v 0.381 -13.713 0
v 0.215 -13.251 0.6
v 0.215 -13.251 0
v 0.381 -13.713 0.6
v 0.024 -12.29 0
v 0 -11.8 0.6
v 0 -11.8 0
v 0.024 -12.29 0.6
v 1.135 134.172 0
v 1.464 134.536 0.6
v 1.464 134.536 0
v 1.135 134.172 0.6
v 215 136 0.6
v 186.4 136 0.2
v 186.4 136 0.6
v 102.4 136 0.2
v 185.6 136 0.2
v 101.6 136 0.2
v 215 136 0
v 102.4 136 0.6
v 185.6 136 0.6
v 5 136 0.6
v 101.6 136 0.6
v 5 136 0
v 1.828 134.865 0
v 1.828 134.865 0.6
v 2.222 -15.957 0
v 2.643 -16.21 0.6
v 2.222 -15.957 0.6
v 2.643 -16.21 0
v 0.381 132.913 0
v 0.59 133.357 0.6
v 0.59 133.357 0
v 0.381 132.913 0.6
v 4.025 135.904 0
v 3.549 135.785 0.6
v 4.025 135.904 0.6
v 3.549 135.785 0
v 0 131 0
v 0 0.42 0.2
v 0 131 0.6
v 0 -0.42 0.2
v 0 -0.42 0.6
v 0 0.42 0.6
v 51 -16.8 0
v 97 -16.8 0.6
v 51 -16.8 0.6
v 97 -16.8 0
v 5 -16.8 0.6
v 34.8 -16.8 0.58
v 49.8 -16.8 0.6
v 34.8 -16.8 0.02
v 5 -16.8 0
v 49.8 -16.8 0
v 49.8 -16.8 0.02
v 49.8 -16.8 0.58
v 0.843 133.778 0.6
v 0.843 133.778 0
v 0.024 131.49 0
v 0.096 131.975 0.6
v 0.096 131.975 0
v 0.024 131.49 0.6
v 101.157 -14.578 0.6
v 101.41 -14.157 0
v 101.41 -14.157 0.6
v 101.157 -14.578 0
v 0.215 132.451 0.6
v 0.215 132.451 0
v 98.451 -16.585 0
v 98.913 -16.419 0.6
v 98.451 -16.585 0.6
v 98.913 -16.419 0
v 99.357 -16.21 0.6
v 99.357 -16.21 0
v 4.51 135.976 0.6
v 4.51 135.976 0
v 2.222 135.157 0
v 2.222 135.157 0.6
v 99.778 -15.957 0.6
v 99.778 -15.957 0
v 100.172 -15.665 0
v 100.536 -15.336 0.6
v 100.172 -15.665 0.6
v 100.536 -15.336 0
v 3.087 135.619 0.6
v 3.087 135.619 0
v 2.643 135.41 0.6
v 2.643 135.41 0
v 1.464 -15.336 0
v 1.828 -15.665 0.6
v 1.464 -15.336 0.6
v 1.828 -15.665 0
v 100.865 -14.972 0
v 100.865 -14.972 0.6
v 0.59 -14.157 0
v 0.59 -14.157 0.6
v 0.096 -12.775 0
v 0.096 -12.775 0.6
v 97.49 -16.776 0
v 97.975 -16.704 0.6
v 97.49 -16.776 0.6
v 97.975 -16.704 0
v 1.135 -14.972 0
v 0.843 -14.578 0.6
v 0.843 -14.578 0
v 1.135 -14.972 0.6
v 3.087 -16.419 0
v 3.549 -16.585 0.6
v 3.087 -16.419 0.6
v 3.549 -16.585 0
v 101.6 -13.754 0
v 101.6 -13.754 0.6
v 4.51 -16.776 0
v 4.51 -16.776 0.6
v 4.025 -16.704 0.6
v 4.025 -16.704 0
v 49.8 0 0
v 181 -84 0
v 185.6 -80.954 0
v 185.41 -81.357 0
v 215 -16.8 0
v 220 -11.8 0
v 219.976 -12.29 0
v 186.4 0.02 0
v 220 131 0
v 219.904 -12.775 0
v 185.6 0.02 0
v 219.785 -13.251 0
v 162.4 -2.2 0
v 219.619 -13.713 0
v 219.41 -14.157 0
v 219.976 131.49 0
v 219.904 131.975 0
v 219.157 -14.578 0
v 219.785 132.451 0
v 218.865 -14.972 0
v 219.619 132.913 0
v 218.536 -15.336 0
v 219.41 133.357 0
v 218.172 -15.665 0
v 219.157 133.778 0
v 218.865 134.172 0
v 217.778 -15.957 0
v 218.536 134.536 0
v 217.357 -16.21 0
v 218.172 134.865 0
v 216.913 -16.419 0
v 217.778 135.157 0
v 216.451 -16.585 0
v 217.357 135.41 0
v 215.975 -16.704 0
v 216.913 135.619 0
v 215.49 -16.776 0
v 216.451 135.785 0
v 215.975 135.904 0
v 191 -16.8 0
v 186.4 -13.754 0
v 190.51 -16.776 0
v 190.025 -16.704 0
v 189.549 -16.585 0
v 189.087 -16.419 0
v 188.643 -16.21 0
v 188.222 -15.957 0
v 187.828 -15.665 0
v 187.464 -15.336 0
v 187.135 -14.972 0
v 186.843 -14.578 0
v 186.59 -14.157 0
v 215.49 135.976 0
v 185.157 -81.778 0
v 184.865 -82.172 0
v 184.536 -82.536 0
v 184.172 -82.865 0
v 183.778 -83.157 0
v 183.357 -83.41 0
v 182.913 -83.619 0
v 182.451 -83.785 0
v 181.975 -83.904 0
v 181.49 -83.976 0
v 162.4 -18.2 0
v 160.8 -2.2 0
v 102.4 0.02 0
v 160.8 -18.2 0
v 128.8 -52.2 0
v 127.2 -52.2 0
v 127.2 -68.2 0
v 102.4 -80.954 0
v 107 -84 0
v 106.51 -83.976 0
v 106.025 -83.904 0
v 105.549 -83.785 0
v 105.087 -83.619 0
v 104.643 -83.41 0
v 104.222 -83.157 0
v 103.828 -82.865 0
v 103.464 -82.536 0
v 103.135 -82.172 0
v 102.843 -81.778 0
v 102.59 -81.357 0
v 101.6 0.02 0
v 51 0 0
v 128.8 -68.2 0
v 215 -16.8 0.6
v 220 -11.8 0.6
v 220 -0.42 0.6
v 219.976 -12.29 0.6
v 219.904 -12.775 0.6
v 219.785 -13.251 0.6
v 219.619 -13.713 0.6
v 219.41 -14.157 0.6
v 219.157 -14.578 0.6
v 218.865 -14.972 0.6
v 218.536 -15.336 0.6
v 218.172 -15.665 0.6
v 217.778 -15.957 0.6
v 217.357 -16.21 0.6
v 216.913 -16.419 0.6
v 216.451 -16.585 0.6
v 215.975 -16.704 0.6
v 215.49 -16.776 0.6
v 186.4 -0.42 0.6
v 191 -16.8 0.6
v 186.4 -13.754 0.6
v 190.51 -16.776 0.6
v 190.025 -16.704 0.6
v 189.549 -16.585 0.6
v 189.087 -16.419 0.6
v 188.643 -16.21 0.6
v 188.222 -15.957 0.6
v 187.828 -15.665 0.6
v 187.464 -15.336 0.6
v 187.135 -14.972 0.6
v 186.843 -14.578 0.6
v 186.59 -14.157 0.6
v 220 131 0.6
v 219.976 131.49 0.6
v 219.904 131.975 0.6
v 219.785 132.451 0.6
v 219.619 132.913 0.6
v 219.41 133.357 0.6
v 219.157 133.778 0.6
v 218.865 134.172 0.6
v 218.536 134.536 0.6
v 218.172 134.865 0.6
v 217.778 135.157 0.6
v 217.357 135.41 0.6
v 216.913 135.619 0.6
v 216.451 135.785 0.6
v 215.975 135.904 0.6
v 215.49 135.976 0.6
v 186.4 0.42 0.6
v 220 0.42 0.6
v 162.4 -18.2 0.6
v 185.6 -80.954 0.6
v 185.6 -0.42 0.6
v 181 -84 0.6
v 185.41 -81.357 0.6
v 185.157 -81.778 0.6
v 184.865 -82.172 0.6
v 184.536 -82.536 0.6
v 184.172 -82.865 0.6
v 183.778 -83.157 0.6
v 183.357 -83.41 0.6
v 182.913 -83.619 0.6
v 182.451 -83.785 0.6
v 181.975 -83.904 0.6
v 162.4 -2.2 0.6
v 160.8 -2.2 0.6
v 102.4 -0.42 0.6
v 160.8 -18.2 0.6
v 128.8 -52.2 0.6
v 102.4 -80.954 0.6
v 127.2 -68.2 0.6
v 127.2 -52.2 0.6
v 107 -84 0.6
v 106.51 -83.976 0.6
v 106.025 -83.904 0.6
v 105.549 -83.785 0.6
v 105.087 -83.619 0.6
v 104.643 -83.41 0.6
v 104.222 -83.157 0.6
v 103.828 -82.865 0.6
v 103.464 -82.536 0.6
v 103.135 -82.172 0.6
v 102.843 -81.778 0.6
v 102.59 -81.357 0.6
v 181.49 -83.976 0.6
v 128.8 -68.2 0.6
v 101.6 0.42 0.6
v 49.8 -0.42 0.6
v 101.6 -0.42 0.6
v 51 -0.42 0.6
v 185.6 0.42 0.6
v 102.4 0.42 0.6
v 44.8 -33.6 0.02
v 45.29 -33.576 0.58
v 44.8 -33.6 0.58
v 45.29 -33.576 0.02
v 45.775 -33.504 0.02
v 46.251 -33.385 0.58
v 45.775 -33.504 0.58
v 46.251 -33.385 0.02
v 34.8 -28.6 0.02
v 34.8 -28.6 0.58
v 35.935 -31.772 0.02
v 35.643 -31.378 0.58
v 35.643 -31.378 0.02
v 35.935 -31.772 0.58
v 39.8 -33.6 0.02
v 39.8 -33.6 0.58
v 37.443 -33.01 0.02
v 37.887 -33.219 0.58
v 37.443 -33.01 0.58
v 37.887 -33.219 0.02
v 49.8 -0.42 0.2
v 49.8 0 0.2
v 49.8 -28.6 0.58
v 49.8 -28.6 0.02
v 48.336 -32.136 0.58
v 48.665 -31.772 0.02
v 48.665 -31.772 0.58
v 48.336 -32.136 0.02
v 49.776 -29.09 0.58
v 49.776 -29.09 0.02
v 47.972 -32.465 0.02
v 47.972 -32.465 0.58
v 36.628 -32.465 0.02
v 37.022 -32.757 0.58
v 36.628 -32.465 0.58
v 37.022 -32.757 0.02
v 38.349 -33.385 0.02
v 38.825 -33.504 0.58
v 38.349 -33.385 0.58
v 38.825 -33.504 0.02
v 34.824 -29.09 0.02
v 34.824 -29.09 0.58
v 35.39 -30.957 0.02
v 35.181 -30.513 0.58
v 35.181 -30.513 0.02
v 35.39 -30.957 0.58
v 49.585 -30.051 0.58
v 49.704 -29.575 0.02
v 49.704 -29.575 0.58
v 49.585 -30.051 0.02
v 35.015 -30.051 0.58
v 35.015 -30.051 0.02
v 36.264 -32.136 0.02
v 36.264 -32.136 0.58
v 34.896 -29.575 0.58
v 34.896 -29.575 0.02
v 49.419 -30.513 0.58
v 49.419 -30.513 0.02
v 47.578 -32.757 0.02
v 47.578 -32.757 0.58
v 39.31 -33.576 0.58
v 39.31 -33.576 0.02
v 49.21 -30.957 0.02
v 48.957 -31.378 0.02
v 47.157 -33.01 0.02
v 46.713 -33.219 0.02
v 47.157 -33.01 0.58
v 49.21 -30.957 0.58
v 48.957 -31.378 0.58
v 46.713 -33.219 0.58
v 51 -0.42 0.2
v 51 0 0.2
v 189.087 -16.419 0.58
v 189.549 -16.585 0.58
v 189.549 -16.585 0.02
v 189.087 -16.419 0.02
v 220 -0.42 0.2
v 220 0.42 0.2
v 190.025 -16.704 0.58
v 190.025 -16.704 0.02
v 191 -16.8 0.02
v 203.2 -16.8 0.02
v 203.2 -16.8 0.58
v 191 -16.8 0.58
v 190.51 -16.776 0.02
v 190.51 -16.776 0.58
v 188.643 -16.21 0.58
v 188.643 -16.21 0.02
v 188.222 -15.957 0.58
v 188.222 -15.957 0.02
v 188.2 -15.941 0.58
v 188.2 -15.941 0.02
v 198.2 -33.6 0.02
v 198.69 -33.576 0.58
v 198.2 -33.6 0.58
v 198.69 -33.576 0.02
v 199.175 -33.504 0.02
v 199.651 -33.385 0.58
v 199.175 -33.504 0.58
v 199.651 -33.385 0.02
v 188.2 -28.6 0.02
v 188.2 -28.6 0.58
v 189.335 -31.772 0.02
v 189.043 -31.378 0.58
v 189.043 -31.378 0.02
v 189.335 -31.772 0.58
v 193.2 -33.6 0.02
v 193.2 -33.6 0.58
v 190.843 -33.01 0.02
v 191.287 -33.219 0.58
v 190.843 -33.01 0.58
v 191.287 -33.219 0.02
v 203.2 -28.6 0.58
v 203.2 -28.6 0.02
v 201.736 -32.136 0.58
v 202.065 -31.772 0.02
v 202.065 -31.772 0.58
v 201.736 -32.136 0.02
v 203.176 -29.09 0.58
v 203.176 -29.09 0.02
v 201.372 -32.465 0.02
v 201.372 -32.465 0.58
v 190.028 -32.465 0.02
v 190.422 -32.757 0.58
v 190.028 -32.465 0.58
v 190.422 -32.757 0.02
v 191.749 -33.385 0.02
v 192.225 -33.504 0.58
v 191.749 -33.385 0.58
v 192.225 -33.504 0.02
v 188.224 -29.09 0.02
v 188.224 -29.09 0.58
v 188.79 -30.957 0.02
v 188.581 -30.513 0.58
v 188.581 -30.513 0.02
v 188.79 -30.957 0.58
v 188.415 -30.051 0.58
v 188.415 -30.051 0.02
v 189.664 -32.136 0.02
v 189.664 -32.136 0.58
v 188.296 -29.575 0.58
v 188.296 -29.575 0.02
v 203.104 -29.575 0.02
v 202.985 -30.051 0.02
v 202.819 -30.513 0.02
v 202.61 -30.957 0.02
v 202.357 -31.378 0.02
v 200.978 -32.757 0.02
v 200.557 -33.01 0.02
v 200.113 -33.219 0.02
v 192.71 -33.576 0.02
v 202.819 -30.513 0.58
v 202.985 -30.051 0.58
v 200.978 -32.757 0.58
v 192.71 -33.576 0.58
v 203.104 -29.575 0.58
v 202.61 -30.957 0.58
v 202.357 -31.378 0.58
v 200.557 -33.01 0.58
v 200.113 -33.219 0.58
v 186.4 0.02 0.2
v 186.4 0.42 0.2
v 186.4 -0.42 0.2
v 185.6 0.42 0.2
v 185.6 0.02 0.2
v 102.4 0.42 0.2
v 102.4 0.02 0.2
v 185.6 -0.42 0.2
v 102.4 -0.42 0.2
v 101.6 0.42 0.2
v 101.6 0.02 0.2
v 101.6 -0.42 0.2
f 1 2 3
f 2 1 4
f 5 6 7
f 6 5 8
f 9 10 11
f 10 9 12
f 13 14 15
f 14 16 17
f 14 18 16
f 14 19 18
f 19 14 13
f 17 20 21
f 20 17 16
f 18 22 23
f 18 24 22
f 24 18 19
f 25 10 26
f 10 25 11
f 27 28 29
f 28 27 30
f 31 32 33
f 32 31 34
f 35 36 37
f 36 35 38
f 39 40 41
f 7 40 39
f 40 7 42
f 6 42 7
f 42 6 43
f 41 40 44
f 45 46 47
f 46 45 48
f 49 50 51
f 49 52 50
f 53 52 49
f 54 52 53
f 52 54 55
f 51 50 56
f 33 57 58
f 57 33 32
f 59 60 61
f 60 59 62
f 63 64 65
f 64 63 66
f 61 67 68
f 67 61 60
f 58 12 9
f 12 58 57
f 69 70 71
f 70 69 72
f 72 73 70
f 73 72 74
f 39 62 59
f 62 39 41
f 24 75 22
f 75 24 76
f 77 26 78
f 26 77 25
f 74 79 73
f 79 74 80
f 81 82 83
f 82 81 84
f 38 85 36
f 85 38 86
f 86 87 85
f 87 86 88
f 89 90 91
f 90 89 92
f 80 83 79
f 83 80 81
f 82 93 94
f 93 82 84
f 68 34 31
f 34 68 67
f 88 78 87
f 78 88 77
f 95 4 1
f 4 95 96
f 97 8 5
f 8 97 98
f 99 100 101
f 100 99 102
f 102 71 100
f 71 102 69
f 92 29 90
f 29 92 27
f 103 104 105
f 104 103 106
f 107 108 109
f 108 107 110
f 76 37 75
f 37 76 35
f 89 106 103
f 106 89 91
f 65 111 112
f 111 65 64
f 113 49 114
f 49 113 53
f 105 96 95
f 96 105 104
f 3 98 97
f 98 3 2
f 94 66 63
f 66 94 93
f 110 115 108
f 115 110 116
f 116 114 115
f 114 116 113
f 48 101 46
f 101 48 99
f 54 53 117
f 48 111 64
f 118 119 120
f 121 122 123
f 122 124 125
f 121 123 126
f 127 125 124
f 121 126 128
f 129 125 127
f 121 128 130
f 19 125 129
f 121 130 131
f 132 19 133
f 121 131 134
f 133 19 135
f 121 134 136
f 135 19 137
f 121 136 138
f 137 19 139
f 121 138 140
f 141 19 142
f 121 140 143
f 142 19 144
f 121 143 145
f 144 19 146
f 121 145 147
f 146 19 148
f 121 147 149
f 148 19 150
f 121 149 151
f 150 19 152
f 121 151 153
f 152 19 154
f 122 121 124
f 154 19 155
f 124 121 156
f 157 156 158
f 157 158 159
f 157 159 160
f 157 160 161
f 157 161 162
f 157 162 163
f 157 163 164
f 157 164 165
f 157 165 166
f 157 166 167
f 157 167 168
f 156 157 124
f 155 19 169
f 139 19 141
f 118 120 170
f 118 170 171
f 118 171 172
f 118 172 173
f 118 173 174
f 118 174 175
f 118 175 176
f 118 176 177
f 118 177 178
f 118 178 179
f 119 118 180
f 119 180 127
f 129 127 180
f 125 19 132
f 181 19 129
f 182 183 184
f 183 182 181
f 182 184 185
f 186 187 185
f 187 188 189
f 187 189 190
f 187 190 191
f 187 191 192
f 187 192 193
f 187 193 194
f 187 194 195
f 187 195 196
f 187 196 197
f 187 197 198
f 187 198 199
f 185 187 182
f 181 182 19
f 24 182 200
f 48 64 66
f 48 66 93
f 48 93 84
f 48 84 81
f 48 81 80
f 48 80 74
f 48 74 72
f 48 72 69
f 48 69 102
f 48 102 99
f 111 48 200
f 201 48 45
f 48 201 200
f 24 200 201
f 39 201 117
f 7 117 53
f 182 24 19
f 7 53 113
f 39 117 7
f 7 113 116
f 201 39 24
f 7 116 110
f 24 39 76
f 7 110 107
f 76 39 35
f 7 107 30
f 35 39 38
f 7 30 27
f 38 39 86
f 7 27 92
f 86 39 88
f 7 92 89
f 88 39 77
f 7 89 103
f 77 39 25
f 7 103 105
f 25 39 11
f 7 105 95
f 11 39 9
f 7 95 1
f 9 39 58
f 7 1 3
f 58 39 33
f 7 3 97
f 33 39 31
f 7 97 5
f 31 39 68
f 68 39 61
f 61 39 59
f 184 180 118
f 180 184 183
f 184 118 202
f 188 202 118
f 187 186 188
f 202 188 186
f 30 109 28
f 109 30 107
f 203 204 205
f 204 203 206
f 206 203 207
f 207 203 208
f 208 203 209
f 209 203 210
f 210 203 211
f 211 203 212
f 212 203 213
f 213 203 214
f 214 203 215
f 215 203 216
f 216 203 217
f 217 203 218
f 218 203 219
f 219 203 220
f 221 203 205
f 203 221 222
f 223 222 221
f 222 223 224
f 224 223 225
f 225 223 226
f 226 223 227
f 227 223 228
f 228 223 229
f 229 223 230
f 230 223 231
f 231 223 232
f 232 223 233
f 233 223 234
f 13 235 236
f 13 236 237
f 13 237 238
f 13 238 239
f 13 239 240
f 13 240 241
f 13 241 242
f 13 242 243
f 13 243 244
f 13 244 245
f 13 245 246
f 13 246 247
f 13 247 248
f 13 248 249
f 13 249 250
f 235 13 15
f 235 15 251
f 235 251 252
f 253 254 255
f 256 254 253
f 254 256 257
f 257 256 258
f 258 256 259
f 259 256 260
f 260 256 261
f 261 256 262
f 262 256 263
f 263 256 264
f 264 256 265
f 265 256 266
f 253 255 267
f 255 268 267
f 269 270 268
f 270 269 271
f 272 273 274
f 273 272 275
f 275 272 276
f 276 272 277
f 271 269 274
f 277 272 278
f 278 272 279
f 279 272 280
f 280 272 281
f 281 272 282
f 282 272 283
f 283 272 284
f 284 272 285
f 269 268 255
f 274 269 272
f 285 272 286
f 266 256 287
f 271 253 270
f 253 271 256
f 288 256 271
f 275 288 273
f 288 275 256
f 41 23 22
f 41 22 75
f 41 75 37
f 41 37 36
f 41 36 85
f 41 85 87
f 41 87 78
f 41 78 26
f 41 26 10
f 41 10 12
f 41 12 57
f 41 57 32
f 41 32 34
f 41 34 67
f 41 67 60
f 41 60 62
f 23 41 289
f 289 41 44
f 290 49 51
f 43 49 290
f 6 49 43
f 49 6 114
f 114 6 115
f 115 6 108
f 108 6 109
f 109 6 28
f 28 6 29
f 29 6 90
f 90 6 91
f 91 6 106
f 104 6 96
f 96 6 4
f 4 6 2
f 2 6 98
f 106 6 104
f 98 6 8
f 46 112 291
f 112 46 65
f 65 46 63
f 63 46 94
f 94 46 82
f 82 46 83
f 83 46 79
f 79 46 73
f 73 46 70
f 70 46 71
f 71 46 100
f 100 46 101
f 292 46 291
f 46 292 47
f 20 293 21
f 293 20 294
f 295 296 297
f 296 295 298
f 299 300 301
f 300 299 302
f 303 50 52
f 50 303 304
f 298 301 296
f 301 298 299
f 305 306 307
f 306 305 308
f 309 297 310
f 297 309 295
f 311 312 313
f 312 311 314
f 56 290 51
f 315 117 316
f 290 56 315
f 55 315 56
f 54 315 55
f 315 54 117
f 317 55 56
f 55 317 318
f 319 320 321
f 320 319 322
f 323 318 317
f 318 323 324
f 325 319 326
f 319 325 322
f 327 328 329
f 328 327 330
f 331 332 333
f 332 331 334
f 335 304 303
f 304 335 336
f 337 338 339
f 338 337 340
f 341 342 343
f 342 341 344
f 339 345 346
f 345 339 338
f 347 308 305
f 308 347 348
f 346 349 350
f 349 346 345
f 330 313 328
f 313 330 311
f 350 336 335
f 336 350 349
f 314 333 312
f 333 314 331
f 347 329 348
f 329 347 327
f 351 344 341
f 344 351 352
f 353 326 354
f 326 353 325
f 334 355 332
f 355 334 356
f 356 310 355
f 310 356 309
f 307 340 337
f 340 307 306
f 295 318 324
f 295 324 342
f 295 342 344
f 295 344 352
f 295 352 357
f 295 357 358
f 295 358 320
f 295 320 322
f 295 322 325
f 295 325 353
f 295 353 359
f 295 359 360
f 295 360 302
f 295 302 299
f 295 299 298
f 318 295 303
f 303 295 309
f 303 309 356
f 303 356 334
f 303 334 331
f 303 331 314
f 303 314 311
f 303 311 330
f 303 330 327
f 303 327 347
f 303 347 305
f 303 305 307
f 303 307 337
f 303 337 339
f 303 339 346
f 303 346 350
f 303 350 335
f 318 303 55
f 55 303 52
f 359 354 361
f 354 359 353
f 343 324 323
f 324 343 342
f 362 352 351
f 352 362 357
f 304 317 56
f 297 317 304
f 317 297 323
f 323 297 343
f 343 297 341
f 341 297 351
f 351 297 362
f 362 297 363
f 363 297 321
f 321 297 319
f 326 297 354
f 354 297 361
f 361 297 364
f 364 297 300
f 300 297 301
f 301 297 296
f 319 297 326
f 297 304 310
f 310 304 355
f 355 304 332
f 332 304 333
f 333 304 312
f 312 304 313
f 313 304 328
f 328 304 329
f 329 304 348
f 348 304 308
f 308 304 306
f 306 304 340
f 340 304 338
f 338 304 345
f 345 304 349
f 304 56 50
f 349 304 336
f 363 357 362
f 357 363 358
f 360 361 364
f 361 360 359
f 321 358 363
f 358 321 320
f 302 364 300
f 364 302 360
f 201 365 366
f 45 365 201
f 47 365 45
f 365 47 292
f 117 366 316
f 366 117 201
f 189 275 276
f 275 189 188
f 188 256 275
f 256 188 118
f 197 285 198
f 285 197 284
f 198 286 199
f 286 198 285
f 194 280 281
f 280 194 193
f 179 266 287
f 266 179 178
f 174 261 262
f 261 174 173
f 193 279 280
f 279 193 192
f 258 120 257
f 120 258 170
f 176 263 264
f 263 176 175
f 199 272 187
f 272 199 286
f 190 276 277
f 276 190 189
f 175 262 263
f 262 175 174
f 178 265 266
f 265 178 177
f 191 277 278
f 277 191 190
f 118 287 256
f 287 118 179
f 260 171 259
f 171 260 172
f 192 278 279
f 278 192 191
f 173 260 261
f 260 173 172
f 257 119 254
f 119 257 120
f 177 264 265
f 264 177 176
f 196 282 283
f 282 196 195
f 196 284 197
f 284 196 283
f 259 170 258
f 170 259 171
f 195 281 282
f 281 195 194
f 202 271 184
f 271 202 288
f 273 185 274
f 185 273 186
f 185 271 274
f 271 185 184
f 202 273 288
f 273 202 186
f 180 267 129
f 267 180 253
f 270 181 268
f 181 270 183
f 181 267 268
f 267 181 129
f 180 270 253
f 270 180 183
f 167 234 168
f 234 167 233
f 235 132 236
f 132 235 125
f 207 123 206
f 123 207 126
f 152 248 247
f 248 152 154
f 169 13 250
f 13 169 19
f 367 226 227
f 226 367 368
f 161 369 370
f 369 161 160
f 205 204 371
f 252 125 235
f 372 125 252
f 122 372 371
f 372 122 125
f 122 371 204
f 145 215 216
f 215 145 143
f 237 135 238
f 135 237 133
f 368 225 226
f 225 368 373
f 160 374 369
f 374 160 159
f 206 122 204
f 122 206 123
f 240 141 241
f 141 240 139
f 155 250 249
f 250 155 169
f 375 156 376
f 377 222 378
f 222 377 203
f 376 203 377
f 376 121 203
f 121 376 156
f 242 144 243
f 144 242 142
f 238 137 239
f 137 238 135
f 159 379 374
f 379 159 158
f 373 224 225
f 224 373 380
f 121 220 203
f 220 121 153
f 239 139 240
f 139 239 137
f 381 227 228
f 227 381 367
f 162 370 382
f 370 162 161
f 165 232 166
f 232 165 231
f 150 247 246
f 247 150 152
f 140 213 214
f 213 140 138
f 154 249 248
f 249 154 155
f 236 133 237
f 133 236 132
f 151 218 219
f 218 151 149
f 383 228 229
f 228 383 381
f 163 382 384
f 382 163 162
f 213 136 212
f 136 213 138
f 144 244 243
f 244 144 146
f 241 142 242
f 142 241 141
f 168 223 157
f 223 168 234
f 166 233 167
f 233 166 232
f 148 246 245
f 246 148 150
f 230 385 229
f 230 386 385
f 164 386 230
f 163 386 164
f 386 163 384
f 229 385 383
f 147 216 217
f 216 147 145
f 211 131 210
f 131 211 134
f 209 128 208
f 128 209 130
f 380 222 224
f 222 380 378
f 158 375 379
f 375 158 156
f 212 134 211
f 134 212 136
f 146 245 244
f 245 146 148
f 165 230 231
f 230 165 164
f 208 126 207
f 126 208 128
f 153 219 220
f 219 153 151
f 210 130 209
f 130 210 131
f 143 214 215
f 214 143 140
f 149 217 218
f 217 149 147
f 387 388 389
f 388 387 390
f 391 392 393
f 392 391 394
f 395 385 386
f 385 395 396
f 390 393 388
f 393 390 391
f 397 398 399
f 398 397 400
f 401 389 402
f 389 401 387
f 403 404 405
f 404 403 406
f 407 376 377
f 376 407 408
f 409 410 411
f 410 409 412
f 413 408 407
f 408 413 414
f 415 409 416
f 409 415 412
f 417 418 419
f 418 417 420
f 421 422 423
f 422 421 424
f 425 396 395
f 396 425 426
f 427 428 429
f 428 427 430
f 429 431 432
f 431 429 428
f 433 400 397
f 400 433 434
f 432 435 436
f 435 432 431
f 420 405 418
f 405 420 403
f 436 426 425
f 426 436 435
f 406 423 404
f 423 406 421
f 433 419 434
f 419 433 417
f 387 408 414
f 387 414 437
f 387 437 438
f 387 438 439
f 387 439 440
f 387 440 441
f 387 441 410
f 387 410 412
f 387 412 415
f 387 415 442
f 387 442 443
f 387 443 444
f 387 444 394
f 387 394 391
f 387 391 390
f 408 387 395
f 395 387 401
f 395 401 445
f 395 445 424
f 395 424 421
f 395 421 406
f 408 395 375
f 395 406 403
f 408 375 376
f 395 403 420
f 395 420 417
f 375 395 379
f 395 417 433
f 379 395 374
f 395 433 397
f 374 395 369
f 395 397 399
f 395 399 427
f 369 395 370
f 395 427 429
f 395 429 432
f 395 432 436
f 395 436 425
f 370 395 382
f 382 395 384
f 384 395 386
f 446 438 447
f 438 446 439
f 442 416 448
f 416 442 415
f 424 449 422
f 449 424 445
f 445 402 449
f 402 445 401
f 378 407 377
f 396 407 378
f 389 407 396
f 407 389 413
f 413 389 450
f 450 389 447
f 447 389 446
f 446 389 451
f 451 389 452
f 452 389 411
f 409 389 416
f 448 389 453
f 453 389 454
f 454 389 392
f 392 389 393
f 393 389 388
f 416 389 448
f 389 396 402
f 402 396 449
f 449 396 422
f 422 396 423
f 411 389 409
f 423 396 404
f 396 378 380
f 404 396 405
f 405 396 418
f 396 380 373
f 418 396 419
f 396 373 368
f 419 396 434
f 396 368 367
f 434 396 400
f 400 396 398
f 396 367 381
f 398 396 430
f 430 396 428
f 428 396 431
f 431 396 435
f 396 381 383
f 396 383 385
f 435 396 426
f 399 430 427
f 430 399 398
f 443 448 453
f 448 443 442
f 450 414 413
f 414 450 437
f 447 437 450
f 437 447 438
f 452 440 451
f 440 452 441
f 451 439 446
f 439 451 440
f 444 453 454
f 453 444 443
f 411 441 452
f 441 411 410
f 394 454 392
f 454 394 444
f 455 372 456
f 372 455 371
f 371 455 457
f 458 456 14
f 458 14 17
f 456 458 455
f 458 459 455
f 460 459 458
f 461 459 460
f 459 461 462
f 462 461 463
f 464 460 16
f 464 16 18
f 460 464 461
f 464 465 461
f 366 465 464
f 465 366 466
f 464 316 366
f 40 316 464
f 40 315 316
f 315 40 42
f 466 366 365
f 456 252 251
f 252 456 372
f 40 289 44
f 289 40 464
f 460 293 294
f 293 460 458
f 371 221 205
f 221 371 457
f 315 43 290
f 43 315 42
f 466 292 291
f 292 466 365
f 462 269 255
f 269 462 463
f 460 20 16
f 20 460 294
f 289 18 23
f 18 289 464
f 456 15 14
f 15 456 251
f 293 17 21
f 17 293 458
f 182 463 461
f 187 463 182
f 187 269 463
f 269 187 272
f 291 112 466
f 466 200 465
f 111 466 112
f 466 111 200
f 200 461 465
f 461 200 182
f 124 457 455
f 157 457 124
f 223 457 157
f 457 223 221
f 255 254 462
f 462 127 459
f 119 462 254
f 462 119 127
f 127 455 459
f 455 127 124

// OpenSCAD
/*
Script Name: EmSCAD Trifold Shade
Description: Parametric shade for phones and tablets
Repository: https://github.com/em-sea/EmSCAD/
Copyright (C) 2026 em-sea
SPDX-License-Identifier: GPL-3.0-or-later
Glossary:
    Panel: One of three main shade parts
    Tab: Bottom panel portion to fold under the phone
    Connector: Smaller tab at the bottom of a tab to insert into a connector slot
    Connector slot: Narrow hole in the center tab that holds a connector
    Hinge: Indentations between the panels and tabs to enable folding
    Frame: Solid margin kept around connectors and slots
    ps_: Prefix for Popsocket cutout variables
*/

/* [General Dimensions (sizes in mm and %)] */
// Total width and length of the shade with tabs
max_size = 220; // [100:1:400]
center_panel_width = 84; // [50:1:200]
left_panel_percent = 75; // [0:1:100]
// Length of the center tab (0 uses the center panel width)
center_tab_length = 0; // [0:1:200]

/* [Popsocket Cutout (mm)] */
// Distance from the fold line to the center of the cutout
ps_top_distance = 84; // [0:1:200]
// Cutout radius (0 disables)
ps_radius = 0; // [0:1:30]
ps_slot_width = 10; // [1:1:30]

/* [Aesthetics & Tolerances (mm or %)] */
connector_width = 15; // [1:1:50]
connector_percent = 40; // [0:1:100]
// Distance of each connector slot from the center tab's side edge (percent of center panel width)
connector_slot_distance = 30; // [0:1:100]
connector_frame = 20; // [1:1:50]
corner_radius = 5; // [1:1:20]
connector_slot_clearance = 0.2; // [0:0.05:1]

/* [Printing Variables] */
// Extrusion line width of nozzle, hinges are 2x
extrusion_width = 0.4; // [0.2:0.01:1.2]
shade_thickness = 0.6; // [0.2:0.1:3]
// First layer height (mm)
first_height = 0.2; // [0.1:0.05:0.6]
// Height of each layer after the first (mm)
layer_height = 0.2; // [0.05:0.05:0.6]
// Layers left under each hinge, counting the first layer
hinge_layers = 1; // [1:1:5]

/* [Hidden] */
$fn = $preview ? 32 : 64;
EPSILON = 0.02;

// Calculated Variables
hinge_width = extrusion_width * 2;
left_panel_width = (max_size - center_panel_width) * left_panel_percent / 100;
right_panel_width = max_size - center_panel_width - left_panel_width;
middle_tab_length = center_tab_length > 0 ? center_tab_length : center_panel_width;
connector_slot_w = shade_thickness * 2;
connector_slot_l = connector_width + shade_thickness;
connector_slot_h = shade_thickness * 2 + (EPSILON * 2);
connector_l = center_panel_width * connector_percent / 100;
longest_tab = max(middle_tab_length, connector_l);
shade_length = max_size - longest_tab;
frame_size = center_panel_width * connector_frame / 100;
slot_x_offset = center_panel_width * connector_slot_distance / 100;
cut_height = shade_thickness + 2 * EPSILON;
top_cut_z = first_height + ((hinge_layers - 1) * layer_height);
large_connector_slot_w = connector_slot_w + (2 * connector_slot_clearance);
large_connector_slot_l = connector_slot_l + (2 * connector_slot_clearance);
right_panel_start_x = left_panel_width + center_panel_width;
lowest_connector = (ps_radius > 0) ? ps_top_distance - ps_radius + frame_size : middle_tab_length;
right_panel_connector_end = right_panel_start_x + min(right_panel_width, lowest_connector) - frame_size;
right_panel_connector_start = max(right_panel_connector_end - connector_width, right_panel_start_x);
left_panel_connector_start = max(left_panel_width - min(left_panel_width, lowest_connector) + frame_size, frame_size);
left_panel_connector_end = min(left_panel_width, left_panel_connector_start + connector_width);

module LeftPanel() {
    difference() {
        union() {
            CubeWithTab(left_panel_width, shade_length, frame_size, corner_radius, "purple", round_top_left = true);
            if (left_panel_connector_end < left_panel_width) {
                translate([left_panel_connector_start, 0, 0])
                    CubeWithTab(connector_width, 0, connector_l, corner_radius, "red", inset = EPSILON);
            }
        }
        if (left_panel_connector_end + connector_width + connector_slot_w < left_panel_width) {
            ConnectorSlot(left_panel_connector_end);
        }
    }
}

module RightPanel() {
    difference() {
        union() {
            translate([right_panel_start_x, 0, 0])
                CubeWithTab(right_panel_width, shade_length, frame_size, corner_radius, "yellow", round_top_right = true);
            if (right_panel_connector_start < right_panel_connector_end) {
                translate([right_panel_connector_start, 0, 0])
                    CubeWithTab(connector_width, 0, connector_l, corner_radius, "orange", inset = EPSILON);
            }
        }
        if (right_panel_start_x + frame_size < right_panel_connector_start) {
            ConnectorSlot(right_panel_connector_start - connector_slot_w);
        }
    }
}

module CenterPanel() {
    translate([left_panel_width, 0, 0]) {
        difference() {
            CubeWithTab(center_panel_width, shade_length, middle_tab_length, corner_radius, "lightseagreen");
            if (ps_radius > 0) {
                PopsocketCutout();
            }
            if (left_panel_connector_end < left_panel_width) {
                CenterConnectorSlot(slot_x_offset, -left_panel_width + left_panel_connector_end - large_connector_slot_l);
            }
            if (right_panel_connector_start < right_panel_connector_end) {
                CenterConnectorSlot(center_panel_width - slot_x_offset, -right_panel_connector_start + right_panel_start_x - large_connector_slot_l);
            }
        }
    }
}

module PopsocketCutout() {
    translate([center_panel_width / 2, -ps_top_distance, -EPSILON]) {
        cylinder(r = ps_radius, h = cut_height);
        translate([-(ps_slot_width / 2), -max_size, 0])
            cube([ps_slot_width, max_size, cut_height]);
    }
}

module ConnectorSlot(x) {
    translate([x, -connector_l - EPSILON, -EPSILON])
        cube([connector_slot_w, connector_l + EPSILON, cut_height]);
}

module CenterConnectorSlot(x, y) {
    translate([x, y, -EPSILON])
        cube([large_connector_slot_w, large_connector_slot_l, connector_slot_h]);
}

module ApplyHingeCuts() {
    ApplyHingeSlits();
    ApplyTabSeparationCuts();
}

module ApplyHingeSlits() {
    HingeSlit(0, -hinge_width / 2, max_size, hinge_width);
    HingeSlit(left_panel_width - hinge_width / 2, 0, hinge_width, max_size);
    HingeSlit(right_panel_start_x - hinge_width / 2, 0, hinge_width, max_size);
}

module ApplyTabSeparationCuts() {
    TabSeparationCut(left_panel_width - hinge_width / 2);
    TabSeparationCut(right_panel_start_x - hinge_width / 2);
}

module HingeSlit(x, y, w, l) {
    translate([x, y - EPSILON, top_cut_z])
        cube([w, l + (2 * EPSILON), shade_thickness + EPSILON]);
}

module TabSeparationCut(x) {
    translate([x, -max_size, -EPSILON])
        cube([hinge_width, max_size + EPSILON, cut_height]);
}

module CubeWithTab(w, l, tab_l, r, c, round_top_left = false, round_top_right = false, inset = 0) {
    color(c) translate([0, 0, inset])
        linear_extrude(height = shade_thickness - inset * 2) {
            PanelBody(w, l, r, round_top_left, round_top_right);
            PanelTab(w, tab_l, r);
        }
}

module PanelBody(w, l, r, round_top_left, round_top_right) {
    if (l > 0) {
        safe_body_r = max(0.01, min(r, w / 2, l / 2));
        hull() {
            square([w, EPSILON]);
            if (round_top_left) {
                translate([safe_body_r, l - safe_body_r]) circle(r = safe_body_r);
            } else {
                translate([0, l - EPSILON]) square([EPSILON, EPSILON]);
            }
            if (round_top_right) {
                translate([w - safe_body_r, l - safe_body_r]) circle(r = safe_body_r);
            } else {
                translate([w - EPSILON, l - EPSILON]) square([EPSILON, EPSILON]);
            }
        }
    }
}

module PanelTab(w, tab_l, r) {
    if (tab_l > 0) {
        safe_tab_r = max(0.01, min(r, w / 2, tab_l / 2));
        hull() {
            translate([0, -EPSILON]) square([w, EPSILON]);
            translate([safe_tab_r, -tab_l + safe_tab_r]) circle(r = safe_tab_r);
            translate([w - safe_tab_r, -tab_l + safe_tab_r]) circle(r = safe_tab_r);
        }
    }
}

difference() {
    union() {
        LeftPanel();
        CenterPanel();
        RightPanel();
    }
    ApplyHingeCuts();
}
